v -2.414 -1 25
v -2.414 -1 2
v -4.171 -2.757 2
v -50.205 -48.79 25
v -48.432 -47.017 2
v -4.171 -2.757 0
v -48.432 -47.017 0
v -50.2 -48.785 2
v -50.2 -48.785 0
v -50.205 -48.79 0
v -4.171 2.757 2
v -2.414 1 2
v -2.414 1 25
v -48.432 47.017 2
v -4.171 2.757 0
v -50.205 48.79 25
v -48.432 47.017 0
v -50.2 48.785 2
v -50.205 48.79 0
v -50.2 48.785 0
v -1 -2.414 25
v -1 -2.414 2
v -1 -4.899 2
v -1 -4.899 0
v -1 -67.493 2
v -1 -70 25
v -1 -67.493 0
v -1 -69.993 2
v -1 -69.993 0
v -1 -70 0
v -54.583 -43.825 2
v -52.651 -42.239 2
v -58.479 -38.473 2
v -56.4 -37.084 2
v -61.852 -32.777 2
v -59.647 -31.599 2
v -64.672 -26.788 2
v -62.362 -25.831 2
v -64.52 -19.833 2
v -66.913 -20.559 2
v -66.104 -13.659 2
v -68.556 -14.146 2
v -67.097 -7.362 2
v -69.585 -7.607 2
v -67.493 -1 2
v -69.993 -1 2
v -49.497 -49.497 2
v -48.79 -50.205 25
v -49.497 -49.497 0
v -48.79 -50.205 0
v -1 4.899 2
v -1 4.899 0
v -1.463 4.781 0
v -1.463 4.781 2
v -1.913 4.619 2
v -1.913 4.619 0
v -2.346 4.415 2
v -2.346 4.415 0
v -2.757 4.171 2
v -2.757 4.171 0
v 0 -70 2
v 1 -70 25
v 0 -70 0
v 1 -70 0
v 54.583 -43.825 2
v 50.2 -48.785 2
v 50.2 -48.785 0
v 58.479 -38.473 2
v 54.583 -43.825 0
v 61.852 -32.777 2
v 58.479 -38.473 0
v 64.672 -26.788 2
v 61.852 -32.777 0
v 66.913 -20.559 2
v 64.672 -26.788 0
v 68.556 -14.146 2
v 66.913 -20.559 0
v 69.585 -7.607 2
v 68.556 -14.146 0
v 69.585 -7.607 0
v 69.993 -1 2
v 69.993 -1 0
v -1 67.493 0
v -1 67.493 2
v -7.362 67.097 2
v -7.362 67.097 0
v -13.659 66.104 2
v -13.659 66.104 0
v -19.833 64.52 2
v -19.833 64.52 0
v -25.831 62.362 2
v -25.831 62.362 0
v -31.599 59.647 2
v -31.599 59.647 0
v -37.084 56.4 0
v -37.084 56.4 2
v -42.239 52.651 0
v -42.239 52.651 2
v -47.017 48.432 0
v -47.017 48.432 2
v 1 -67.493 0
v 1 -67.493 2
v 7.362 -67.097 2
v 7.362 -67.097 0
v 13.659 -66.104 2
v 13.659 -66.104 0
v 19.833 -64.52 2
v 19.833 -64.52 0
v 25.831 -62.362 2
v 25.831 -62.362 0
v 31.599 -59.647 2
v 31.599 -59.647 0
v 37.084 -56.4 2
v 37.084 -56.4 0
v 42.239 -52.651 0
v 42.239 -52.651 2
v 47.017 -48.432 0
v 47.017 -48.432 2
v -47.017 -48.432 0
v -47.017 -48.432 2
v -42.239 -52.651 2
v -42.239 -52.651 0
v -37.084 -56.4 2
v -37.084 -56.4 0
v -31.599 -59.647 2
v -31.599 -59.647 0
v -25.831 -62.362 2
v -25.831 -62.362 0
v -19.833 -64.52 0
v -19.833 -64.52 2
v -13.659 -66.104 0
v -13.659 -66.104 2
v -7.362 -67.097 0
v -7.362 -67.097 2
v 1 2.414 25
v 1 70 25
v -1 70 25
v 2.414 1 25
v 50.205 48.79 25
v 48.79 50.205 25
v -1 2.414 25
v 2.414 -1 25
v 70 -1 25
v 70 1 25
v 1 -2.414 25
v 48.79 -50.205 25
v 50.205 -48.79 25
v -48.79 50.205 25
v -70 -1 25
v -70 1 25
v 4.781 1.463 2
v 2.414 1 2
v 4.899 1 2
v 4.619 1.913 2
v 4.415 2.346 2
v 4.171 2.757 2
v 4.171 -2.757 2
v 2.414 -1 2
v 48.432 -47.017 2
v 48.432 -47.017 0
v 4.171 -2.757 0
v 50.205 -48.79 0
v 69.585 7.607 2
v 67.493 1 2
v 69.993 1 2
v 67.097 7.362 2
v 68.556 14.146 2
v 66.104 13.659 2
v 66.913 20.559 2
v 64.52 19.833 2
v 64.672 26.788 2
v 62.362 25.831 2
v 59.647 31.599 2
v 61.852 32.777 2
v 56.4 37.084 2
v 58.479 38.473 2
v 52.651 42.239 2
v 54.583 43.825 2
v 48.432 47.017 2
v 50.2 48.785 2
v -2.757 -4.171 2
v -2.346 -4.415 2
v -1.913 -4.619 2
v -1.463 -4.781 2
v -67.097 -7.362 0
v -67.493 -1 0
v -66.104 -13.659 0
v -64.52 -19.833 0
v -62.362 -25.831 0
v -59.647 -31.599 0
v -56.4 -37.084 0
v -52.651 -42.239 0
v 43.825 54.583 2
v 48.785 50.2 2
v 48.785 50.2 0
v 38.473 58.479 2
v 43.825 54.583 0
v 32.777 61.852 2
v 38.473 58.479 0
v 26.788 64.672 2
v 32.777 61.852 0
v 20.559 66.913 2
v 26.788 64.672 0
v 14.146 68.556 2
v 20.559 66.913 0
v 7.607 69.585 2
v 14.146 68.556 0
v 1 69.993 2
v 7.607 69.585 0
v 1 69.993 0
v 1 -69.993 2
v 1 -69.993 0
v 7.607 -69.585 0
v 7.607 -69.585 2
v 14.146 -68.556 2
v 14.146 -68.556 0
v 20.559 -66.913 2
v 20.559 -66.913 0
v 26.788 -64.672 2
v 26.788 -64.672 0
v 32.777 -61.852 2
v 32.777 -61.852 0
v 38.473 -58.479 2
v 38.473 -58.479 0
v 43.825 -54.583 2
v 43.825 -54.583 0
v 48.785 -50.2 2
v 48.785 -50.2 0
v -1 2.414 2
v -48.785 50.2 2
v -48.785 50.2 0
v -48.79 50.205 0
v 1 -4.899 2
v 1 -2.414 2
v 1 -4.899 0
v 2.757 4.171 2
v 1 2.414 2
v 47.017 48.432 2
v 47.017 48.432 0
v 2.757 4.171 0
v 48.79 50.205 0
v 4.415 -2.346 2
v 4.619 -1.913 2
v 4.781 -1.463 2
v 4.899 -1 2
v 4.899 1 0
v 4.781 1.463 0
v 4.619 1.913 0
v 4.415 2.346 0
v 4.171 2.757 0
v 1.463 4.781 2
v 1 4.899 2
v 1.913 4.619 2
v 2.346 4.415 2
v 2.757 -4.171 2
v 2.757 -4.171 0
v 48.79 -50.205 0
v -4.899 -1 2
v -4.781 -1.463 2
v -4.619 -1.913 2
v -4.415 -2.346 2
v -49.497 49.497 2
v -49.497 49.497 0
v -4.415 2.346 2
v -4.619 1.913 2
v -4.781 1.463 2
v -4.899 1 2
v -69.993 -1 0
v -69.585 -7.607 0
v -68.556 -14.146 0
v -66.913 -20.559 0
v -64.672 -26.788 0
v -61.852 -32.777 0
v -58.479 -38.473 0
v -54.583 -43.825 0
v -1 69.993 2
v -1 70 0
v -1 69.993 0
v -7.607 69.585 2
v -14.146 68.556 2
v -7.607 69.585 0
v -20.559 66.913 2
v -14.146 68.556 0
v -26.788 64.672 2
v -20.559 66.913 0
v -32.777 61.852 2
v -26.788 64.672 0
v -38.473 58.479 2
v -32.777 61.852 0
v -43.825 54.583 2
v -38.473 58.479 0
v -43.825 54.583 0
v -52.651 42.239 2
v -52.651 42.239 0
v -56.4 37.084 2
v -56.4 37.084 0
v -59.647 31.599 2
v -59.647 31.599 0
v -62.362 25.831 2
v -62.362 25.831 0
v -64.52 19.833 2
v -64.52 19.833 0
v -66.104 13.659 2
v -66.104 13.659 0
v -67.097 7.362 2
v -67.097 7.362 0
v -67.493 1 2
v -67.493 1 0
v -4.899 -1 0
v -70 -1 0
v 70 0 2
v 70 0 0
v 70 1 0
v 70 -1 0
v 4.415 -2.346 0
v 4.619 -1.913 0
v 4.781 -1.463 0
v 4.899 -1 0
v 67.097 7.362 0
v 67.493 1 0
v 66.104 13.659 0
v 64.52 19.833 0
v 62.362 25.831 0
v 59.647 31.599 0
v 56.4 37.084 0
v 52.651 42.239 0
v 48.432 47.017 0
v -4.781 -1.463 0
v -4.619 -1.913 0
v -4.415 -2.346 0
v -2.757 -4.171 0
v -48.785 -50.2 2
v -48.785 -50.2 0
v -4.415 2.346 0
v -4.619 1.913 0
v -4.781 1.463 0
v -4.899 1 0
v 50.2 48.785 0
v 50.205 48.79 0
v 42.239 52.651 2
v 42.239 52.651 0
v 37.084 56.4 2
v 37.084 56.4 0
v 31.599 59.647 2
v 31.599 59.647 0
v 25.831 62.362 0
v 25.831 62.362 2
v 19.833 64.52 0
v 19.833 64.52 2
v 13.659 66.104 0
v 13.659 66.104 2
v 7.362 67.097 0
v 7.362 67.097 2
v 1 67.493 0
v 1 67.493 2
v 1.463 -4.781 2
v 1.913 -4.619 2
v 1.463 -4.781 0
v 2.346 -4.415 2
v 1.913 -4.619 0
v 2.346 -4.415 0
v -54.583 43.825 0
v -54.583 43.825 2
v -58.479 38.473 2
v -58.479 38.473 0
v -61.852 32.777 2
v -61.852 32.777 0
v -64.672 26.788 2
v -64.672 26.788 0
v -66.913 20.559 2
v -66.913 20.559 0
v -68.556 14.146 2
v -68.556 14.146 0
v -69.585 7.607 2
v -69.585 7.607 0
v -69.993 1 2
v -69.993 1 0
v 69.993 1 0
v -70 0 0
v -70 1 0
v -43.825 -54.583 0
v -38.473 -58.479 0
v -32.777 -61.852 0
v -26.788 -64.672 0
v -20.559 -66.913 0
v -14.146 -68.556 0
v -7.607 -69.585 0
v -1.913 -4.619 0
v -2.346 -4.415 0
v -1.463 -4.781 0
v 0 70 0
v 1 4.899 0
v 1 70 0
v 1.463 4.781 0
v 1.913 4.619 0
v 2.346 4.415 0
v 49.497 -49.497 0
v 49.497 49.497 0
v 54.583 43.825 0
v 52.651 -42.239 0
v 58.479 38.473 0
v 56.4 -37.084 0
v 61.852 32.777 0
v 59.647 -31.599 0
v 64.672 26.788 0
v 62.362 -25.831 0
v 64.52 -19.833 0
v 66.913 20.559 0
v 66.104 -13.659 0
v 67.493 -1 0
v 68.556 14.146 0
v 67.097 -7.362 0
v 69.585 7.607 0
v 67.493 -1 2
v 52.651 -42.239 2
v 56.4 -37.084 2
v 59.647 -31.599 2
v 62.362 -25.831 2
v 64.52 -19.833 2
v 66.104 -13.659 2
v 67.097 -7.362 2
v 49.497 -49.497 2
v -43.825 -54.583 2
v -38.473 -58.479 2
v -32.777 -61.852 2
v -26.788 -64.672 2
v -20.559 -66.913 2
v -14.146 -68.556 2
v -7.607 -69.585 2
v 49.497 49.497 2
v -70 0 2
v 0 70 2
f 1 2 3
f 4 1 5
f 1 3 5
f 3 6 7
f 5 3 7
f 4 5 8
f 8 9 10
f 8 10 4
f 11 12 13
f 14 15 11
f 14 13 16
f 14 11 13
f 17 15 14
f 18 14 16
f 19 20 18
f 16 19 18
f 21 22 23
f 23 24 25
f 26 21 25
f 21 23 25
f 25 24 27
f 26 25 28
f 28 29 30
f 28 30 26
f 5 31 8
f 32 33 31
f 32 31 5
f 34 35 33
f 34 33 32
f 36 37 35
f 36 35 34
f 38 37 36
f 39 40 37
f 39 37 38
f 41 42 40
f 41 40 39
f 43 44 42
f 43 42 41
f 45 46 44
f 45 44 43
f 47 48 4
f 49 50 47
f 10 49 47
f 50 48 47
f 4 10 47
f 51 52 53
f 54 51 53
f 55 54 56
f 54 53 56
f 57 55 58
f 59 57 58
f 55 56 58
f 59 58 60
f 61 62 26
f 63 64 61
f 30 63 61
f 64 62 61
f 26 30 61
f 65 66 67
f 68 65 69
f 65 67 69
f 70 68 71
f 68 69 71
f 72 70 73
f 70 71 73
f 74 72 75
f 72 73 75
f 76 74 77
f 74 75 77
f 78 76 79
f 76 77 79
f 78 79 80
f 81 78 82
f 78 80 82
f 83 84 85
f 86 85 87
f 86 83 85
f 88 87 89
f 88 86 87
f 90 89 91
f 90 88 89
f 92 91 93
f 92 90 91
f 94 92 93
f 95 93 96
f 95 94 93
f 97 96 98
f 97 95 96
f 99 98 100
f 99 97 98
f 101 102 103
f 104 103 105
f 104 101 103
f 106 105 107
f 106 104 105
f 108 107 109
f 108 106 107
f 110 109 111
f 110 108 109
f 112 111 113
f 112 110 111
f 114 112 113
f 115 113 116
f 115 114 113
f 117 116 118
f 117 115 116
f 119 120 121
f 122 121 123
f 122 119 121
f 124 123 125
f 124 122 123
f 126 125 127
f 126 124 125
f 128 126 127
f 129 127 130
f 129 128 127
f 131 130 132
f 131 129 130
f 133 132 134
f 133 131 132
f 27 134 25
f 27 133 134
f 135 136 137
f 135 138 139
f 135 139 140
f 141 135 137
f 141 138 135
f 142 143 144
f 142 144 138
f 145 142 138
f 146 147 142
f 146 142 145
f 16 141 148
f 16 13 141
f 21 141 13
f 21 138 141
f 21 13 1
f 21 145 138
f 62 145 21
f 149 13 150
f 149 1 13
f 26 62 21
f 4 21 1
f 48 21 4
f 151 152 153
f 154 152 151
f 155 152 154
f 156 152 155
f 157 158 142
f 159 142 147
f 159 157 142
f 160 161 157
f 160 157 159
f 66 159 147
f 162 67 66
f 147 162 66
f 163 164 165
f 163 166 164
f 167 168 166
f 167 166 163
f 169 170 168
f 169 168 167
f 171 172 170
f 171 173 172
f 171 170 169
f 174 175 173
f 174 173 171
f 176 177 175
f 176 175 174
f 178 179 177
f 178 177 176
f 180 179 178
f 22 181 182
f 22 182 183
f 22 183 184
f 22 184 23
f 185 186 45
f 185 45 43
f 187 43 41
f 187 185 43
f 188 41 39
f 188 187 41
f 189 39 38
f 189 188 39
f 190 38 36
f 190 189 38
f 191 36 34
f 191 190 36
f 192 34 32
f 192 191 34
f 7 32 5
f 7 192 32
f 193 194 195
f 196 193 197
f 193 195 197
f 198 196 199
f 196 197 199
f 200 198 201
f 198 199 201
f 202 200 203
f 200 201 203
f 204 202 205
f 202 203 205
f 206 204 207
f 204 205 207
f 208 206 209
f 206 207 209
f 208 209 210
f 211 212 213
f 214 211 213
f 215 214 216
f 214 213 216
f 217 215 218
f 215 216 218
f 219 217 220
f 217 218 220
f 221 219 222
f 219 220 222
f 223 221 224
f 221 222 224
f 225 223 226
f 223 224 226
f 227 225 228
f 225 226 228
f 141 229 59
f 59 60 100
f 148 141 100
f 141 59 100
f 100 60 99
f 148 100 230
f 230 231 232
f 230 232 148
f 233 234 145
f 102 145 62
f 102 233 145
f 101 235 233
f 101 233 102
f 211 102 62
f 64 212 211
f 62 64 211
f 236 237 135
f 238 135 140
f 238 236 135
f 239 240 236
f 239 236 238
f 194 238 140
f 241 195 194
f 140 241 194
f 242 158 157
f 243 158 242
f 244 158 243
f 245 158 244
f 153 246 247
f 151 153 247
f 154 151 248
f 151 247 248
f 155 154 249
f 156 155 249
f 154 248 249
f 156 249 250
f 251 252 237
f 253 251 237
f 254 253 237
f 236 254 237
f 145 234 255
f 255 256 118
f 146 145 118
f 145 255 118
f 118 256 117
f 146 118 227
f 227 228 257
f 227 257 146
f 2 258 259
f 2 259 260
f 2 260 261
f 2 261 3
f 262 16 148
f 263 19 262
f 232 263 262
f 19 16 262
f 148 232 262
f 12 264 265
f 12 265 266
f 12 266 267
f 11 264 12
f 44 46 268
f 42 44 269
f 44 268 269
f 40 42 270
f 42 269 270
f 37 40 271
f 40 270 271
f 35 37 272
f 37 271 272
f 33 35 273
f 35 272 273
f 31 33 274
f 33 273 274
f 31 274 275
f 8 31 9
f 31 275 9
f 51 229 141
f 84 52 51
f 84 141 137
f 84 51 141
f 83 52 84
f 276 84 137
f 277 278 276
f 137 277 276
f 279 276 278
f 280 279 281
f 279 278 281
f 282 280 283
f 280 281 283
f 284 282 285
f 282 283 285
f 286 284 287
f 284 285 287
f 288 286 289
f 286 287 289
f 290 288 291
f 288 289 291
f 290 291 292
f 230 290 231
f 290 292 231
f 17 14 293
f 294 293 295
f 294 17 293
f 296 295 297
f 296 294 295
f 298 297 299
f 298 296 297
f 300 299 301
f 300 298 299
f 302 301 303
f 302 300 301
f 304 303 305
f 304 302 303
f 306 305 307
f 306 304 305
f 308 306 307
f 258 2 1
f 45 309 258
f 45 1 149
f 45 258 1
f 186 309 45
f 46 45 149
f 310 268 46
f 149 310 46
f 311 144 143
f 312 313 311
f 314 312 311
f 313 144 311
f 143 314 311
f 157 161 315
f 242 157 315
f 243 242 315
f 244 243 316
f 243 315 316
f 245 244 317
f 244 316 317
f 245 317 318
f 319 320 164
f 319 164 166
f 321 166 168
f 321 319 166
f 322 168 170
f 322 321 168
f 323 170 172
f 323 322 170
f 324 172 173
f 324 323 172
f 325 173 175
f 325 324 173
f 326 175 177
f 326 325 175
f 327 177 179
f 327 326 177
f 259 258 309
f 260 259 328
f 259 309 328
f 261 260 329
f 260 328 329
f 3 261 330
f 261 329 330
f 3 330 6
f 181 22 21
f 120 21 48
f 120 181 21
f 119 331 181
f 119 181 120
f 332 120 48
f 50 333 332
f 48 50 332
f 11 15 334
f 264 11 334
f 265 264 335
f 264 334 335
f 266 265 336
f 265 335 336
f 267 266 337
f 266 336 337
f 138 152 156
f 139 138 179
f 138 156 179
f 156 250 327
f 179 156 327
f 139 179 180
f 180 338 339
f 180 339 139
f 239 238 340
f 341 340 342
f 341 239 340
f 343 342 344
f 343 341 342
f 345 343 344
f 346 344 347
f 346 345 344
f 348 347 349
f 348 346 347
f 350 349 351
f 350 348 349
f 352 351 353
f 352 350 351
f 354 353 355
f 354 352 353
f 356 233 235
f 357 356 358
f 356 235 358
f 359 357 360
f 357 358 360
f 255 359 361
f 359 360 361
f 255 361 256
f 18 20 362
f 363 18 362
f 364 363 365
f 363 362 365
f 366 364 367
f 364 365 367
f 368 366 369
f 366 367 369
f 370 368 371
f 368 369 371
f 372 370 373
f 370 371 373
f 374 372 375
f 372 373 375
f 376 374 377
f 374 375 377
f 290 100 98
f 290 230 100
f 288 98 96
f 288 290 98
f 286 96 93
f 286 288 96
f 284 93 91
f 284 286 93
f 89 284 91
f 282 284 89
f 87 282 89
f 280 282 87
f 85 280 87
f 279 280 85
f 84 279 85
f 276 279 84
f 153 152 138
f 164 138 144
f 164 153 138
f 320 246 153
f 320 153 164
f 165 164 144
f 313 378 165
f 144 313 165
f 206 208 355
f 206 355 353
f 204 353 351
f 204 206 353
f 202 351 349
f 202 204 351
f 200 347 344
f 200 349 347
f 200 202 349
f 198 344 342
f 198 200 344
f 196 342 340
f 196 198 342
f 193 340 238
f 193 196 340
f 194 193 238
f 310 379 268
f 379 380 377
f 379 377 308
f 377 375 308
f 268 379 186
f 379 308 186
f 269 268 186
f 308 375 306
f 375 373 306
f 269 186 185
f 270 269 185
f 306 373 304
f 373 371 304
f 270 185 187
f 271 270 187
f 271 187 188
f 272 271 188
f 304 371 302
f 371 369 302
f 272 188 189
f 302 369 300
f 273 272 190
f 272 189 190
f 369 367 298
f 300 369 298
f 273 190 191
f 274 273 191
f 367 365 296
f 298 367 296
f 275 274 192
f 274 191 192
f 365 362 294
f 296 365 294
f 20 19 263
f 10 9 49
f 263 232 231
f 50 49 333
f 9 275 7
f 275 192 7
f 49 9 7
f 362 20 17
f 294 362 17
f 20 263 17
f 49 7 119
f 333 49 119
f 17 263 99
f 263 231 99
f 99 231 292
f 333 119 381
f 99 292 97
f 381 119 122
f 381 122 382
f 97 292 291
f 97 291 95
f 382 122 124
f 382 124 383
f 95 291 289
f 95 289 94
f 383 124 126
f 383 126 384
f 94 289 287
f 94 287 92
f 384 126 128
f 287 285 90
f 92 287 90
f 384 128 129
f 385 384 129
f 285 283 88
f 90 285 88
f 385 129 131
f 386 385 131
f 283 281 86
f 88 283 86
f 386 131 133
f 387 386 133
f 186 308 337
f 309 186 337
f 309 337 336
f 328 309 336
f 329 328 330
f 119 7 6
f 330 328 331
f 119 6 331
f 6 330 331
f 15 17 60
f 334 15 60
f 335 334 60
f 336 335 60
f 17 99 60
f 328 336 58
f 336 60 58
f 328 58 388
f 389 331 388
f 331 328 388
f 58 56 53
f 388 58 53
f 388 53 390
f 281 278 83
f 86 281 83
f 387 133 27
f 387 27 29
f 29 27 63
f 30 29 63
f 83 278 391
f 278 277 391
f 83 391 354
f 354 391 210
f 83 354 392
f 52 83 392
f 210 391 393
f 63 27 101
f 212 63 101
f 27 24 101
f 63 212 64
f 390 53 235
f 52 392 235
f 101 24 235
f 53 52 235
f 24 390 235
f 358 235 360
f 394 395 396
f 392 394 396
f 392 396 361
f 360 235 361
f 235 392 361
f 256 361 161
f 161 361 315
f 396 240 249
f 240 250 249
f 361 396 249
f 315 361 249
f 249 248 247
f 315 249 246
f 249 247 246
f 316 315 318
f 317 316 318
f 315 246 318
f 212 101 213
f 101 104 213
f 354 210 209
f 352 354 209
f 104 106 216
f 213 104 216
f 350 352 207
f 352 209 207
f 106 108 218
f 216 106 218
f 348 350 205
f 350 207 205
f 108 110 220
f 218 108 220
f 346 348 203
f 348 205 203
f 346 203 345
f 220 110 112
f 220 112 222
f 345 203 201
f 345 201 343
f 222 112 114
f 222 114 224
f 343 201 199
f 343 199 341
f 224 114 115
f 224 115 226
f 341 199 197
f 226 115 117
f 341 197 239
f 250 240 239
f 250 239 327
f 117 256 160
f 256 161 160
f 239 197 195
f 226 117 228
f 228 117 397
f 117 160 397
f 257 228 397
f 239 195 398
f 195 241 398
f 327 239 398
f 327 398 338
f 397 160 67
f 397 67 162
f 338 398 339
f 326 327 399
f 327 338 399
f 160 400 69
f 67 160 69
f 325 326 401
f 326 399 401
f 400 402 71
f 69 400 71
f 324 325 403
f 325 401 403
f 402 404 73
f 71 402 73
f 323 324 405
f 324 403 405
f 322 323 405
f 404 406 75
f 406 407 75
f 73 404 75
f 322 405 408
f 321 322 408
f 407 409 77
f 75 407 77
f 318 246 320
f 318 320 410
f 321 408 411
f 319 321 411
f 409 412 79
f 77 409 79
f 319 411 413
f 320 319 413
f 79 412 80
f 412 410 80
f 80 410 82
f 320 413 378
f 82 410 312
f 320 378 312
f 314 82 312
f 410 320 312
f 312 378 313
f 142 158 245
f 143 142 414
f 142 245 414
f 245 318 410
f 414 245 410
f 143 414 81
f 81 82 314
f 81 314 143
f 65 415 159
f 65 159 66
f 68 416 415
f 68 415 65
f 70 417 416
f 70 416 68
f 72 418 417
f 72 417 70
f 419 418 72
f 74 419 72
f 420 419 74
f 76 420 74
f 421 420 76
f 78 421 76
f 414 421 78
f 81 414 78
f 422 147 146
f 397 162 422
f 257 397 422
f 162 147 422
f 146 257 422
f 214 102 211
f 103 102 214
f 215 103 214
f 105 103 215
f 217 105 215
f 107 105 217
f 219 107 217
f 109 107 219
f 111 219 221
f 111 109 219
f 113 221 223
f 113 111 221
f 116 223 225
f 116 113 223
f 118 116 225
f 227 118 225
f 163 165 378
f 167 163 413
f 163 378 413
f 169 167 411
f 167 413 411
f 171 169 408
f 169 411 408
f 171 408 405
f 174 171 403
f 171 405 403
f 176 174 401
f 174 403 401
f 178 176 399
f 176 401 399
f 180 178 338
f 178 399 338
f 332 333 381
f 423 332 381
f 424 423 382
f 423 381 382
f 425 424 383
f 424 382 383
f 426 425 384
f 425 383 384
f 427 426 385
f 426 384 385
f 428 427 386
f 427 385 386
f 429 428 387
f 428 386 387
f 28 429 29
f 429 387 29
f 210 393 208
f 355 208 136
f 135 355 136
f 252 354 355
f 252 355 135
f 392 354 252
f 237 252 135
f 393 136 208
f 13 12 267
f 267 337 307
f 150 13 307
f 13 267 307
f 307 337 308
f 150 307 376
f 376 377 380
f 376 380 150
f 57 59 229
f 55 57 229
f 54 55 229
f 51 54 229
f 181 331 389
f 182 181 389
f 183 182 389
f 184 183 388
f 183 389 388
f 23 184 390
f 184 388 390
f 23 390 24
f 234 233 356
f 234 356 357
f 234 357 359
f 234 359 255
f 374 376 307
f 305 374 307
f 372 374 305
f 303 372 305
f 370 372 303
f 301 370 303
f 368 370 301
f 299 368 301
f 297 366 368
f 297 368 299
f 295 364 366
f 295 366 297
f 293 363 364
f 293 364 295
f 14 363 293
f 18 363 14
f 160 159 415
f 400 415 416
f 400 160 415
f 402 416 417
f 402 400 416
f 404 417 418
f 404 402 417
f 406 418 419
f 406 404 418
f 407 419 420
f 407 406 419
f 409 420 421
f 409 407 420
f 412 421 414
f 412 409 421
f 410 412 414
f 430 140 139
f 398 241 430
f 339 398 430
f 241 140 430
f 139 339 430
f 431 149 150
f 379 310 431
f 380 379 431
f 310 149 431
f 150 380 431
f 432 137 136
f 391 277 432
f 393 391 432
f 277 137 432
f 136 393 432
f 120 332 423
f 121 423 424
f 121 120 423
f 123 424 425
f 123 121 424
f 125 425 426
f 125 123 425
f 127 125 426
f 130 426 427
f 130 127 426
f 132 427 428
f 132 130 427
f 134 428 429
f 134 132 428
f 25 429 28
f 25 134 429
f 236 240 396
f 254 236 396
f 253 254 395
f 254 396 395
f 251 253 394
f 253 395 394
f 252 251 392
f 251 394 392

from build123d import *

# Parameters (mm, degrees)
SKETCH_W           = 2
SKETCH_H           = 70
PAD_DEPTH          = 25
POLARPATTERN_COUNT = 8
SKETCH001_R        = 70
SKETCH001_R_2      = 67.5
SKETCH001_R_3      = 5
PAD001_DEPTH       = 2


with BuildPart() as part:
    # Sketch → Pad (new body)
    with BuildSketch(Plane.XY):
        with Locations((0, 35)):
            Rectangle(SKETCH_W, SKETCH_H)
    pad = extrude(amount=PAD_DEPTH)

    # PolarPattern: Pad ×8 about axis
    polarpattern_axis = Axis((0, 0, 0), (0, 0, 1))
    for i in range(1, POLARPATTERN_COUNT):
        add(pad.rotate(polarpattern_axis, i * 360 / POLARPATTERN_COUNT))

    # Sketch001 → Pad001 (join)
    with BuildSketch(Plane.XY):
        Circle(SKETCH001_R)
        Circle(SKETCH001_R_2, mode=Mode.SUBTRACT)
        Circle(SKETCH001_R_3)
    extrude(amount=PAD001_DEPTH)


solid = part.part
